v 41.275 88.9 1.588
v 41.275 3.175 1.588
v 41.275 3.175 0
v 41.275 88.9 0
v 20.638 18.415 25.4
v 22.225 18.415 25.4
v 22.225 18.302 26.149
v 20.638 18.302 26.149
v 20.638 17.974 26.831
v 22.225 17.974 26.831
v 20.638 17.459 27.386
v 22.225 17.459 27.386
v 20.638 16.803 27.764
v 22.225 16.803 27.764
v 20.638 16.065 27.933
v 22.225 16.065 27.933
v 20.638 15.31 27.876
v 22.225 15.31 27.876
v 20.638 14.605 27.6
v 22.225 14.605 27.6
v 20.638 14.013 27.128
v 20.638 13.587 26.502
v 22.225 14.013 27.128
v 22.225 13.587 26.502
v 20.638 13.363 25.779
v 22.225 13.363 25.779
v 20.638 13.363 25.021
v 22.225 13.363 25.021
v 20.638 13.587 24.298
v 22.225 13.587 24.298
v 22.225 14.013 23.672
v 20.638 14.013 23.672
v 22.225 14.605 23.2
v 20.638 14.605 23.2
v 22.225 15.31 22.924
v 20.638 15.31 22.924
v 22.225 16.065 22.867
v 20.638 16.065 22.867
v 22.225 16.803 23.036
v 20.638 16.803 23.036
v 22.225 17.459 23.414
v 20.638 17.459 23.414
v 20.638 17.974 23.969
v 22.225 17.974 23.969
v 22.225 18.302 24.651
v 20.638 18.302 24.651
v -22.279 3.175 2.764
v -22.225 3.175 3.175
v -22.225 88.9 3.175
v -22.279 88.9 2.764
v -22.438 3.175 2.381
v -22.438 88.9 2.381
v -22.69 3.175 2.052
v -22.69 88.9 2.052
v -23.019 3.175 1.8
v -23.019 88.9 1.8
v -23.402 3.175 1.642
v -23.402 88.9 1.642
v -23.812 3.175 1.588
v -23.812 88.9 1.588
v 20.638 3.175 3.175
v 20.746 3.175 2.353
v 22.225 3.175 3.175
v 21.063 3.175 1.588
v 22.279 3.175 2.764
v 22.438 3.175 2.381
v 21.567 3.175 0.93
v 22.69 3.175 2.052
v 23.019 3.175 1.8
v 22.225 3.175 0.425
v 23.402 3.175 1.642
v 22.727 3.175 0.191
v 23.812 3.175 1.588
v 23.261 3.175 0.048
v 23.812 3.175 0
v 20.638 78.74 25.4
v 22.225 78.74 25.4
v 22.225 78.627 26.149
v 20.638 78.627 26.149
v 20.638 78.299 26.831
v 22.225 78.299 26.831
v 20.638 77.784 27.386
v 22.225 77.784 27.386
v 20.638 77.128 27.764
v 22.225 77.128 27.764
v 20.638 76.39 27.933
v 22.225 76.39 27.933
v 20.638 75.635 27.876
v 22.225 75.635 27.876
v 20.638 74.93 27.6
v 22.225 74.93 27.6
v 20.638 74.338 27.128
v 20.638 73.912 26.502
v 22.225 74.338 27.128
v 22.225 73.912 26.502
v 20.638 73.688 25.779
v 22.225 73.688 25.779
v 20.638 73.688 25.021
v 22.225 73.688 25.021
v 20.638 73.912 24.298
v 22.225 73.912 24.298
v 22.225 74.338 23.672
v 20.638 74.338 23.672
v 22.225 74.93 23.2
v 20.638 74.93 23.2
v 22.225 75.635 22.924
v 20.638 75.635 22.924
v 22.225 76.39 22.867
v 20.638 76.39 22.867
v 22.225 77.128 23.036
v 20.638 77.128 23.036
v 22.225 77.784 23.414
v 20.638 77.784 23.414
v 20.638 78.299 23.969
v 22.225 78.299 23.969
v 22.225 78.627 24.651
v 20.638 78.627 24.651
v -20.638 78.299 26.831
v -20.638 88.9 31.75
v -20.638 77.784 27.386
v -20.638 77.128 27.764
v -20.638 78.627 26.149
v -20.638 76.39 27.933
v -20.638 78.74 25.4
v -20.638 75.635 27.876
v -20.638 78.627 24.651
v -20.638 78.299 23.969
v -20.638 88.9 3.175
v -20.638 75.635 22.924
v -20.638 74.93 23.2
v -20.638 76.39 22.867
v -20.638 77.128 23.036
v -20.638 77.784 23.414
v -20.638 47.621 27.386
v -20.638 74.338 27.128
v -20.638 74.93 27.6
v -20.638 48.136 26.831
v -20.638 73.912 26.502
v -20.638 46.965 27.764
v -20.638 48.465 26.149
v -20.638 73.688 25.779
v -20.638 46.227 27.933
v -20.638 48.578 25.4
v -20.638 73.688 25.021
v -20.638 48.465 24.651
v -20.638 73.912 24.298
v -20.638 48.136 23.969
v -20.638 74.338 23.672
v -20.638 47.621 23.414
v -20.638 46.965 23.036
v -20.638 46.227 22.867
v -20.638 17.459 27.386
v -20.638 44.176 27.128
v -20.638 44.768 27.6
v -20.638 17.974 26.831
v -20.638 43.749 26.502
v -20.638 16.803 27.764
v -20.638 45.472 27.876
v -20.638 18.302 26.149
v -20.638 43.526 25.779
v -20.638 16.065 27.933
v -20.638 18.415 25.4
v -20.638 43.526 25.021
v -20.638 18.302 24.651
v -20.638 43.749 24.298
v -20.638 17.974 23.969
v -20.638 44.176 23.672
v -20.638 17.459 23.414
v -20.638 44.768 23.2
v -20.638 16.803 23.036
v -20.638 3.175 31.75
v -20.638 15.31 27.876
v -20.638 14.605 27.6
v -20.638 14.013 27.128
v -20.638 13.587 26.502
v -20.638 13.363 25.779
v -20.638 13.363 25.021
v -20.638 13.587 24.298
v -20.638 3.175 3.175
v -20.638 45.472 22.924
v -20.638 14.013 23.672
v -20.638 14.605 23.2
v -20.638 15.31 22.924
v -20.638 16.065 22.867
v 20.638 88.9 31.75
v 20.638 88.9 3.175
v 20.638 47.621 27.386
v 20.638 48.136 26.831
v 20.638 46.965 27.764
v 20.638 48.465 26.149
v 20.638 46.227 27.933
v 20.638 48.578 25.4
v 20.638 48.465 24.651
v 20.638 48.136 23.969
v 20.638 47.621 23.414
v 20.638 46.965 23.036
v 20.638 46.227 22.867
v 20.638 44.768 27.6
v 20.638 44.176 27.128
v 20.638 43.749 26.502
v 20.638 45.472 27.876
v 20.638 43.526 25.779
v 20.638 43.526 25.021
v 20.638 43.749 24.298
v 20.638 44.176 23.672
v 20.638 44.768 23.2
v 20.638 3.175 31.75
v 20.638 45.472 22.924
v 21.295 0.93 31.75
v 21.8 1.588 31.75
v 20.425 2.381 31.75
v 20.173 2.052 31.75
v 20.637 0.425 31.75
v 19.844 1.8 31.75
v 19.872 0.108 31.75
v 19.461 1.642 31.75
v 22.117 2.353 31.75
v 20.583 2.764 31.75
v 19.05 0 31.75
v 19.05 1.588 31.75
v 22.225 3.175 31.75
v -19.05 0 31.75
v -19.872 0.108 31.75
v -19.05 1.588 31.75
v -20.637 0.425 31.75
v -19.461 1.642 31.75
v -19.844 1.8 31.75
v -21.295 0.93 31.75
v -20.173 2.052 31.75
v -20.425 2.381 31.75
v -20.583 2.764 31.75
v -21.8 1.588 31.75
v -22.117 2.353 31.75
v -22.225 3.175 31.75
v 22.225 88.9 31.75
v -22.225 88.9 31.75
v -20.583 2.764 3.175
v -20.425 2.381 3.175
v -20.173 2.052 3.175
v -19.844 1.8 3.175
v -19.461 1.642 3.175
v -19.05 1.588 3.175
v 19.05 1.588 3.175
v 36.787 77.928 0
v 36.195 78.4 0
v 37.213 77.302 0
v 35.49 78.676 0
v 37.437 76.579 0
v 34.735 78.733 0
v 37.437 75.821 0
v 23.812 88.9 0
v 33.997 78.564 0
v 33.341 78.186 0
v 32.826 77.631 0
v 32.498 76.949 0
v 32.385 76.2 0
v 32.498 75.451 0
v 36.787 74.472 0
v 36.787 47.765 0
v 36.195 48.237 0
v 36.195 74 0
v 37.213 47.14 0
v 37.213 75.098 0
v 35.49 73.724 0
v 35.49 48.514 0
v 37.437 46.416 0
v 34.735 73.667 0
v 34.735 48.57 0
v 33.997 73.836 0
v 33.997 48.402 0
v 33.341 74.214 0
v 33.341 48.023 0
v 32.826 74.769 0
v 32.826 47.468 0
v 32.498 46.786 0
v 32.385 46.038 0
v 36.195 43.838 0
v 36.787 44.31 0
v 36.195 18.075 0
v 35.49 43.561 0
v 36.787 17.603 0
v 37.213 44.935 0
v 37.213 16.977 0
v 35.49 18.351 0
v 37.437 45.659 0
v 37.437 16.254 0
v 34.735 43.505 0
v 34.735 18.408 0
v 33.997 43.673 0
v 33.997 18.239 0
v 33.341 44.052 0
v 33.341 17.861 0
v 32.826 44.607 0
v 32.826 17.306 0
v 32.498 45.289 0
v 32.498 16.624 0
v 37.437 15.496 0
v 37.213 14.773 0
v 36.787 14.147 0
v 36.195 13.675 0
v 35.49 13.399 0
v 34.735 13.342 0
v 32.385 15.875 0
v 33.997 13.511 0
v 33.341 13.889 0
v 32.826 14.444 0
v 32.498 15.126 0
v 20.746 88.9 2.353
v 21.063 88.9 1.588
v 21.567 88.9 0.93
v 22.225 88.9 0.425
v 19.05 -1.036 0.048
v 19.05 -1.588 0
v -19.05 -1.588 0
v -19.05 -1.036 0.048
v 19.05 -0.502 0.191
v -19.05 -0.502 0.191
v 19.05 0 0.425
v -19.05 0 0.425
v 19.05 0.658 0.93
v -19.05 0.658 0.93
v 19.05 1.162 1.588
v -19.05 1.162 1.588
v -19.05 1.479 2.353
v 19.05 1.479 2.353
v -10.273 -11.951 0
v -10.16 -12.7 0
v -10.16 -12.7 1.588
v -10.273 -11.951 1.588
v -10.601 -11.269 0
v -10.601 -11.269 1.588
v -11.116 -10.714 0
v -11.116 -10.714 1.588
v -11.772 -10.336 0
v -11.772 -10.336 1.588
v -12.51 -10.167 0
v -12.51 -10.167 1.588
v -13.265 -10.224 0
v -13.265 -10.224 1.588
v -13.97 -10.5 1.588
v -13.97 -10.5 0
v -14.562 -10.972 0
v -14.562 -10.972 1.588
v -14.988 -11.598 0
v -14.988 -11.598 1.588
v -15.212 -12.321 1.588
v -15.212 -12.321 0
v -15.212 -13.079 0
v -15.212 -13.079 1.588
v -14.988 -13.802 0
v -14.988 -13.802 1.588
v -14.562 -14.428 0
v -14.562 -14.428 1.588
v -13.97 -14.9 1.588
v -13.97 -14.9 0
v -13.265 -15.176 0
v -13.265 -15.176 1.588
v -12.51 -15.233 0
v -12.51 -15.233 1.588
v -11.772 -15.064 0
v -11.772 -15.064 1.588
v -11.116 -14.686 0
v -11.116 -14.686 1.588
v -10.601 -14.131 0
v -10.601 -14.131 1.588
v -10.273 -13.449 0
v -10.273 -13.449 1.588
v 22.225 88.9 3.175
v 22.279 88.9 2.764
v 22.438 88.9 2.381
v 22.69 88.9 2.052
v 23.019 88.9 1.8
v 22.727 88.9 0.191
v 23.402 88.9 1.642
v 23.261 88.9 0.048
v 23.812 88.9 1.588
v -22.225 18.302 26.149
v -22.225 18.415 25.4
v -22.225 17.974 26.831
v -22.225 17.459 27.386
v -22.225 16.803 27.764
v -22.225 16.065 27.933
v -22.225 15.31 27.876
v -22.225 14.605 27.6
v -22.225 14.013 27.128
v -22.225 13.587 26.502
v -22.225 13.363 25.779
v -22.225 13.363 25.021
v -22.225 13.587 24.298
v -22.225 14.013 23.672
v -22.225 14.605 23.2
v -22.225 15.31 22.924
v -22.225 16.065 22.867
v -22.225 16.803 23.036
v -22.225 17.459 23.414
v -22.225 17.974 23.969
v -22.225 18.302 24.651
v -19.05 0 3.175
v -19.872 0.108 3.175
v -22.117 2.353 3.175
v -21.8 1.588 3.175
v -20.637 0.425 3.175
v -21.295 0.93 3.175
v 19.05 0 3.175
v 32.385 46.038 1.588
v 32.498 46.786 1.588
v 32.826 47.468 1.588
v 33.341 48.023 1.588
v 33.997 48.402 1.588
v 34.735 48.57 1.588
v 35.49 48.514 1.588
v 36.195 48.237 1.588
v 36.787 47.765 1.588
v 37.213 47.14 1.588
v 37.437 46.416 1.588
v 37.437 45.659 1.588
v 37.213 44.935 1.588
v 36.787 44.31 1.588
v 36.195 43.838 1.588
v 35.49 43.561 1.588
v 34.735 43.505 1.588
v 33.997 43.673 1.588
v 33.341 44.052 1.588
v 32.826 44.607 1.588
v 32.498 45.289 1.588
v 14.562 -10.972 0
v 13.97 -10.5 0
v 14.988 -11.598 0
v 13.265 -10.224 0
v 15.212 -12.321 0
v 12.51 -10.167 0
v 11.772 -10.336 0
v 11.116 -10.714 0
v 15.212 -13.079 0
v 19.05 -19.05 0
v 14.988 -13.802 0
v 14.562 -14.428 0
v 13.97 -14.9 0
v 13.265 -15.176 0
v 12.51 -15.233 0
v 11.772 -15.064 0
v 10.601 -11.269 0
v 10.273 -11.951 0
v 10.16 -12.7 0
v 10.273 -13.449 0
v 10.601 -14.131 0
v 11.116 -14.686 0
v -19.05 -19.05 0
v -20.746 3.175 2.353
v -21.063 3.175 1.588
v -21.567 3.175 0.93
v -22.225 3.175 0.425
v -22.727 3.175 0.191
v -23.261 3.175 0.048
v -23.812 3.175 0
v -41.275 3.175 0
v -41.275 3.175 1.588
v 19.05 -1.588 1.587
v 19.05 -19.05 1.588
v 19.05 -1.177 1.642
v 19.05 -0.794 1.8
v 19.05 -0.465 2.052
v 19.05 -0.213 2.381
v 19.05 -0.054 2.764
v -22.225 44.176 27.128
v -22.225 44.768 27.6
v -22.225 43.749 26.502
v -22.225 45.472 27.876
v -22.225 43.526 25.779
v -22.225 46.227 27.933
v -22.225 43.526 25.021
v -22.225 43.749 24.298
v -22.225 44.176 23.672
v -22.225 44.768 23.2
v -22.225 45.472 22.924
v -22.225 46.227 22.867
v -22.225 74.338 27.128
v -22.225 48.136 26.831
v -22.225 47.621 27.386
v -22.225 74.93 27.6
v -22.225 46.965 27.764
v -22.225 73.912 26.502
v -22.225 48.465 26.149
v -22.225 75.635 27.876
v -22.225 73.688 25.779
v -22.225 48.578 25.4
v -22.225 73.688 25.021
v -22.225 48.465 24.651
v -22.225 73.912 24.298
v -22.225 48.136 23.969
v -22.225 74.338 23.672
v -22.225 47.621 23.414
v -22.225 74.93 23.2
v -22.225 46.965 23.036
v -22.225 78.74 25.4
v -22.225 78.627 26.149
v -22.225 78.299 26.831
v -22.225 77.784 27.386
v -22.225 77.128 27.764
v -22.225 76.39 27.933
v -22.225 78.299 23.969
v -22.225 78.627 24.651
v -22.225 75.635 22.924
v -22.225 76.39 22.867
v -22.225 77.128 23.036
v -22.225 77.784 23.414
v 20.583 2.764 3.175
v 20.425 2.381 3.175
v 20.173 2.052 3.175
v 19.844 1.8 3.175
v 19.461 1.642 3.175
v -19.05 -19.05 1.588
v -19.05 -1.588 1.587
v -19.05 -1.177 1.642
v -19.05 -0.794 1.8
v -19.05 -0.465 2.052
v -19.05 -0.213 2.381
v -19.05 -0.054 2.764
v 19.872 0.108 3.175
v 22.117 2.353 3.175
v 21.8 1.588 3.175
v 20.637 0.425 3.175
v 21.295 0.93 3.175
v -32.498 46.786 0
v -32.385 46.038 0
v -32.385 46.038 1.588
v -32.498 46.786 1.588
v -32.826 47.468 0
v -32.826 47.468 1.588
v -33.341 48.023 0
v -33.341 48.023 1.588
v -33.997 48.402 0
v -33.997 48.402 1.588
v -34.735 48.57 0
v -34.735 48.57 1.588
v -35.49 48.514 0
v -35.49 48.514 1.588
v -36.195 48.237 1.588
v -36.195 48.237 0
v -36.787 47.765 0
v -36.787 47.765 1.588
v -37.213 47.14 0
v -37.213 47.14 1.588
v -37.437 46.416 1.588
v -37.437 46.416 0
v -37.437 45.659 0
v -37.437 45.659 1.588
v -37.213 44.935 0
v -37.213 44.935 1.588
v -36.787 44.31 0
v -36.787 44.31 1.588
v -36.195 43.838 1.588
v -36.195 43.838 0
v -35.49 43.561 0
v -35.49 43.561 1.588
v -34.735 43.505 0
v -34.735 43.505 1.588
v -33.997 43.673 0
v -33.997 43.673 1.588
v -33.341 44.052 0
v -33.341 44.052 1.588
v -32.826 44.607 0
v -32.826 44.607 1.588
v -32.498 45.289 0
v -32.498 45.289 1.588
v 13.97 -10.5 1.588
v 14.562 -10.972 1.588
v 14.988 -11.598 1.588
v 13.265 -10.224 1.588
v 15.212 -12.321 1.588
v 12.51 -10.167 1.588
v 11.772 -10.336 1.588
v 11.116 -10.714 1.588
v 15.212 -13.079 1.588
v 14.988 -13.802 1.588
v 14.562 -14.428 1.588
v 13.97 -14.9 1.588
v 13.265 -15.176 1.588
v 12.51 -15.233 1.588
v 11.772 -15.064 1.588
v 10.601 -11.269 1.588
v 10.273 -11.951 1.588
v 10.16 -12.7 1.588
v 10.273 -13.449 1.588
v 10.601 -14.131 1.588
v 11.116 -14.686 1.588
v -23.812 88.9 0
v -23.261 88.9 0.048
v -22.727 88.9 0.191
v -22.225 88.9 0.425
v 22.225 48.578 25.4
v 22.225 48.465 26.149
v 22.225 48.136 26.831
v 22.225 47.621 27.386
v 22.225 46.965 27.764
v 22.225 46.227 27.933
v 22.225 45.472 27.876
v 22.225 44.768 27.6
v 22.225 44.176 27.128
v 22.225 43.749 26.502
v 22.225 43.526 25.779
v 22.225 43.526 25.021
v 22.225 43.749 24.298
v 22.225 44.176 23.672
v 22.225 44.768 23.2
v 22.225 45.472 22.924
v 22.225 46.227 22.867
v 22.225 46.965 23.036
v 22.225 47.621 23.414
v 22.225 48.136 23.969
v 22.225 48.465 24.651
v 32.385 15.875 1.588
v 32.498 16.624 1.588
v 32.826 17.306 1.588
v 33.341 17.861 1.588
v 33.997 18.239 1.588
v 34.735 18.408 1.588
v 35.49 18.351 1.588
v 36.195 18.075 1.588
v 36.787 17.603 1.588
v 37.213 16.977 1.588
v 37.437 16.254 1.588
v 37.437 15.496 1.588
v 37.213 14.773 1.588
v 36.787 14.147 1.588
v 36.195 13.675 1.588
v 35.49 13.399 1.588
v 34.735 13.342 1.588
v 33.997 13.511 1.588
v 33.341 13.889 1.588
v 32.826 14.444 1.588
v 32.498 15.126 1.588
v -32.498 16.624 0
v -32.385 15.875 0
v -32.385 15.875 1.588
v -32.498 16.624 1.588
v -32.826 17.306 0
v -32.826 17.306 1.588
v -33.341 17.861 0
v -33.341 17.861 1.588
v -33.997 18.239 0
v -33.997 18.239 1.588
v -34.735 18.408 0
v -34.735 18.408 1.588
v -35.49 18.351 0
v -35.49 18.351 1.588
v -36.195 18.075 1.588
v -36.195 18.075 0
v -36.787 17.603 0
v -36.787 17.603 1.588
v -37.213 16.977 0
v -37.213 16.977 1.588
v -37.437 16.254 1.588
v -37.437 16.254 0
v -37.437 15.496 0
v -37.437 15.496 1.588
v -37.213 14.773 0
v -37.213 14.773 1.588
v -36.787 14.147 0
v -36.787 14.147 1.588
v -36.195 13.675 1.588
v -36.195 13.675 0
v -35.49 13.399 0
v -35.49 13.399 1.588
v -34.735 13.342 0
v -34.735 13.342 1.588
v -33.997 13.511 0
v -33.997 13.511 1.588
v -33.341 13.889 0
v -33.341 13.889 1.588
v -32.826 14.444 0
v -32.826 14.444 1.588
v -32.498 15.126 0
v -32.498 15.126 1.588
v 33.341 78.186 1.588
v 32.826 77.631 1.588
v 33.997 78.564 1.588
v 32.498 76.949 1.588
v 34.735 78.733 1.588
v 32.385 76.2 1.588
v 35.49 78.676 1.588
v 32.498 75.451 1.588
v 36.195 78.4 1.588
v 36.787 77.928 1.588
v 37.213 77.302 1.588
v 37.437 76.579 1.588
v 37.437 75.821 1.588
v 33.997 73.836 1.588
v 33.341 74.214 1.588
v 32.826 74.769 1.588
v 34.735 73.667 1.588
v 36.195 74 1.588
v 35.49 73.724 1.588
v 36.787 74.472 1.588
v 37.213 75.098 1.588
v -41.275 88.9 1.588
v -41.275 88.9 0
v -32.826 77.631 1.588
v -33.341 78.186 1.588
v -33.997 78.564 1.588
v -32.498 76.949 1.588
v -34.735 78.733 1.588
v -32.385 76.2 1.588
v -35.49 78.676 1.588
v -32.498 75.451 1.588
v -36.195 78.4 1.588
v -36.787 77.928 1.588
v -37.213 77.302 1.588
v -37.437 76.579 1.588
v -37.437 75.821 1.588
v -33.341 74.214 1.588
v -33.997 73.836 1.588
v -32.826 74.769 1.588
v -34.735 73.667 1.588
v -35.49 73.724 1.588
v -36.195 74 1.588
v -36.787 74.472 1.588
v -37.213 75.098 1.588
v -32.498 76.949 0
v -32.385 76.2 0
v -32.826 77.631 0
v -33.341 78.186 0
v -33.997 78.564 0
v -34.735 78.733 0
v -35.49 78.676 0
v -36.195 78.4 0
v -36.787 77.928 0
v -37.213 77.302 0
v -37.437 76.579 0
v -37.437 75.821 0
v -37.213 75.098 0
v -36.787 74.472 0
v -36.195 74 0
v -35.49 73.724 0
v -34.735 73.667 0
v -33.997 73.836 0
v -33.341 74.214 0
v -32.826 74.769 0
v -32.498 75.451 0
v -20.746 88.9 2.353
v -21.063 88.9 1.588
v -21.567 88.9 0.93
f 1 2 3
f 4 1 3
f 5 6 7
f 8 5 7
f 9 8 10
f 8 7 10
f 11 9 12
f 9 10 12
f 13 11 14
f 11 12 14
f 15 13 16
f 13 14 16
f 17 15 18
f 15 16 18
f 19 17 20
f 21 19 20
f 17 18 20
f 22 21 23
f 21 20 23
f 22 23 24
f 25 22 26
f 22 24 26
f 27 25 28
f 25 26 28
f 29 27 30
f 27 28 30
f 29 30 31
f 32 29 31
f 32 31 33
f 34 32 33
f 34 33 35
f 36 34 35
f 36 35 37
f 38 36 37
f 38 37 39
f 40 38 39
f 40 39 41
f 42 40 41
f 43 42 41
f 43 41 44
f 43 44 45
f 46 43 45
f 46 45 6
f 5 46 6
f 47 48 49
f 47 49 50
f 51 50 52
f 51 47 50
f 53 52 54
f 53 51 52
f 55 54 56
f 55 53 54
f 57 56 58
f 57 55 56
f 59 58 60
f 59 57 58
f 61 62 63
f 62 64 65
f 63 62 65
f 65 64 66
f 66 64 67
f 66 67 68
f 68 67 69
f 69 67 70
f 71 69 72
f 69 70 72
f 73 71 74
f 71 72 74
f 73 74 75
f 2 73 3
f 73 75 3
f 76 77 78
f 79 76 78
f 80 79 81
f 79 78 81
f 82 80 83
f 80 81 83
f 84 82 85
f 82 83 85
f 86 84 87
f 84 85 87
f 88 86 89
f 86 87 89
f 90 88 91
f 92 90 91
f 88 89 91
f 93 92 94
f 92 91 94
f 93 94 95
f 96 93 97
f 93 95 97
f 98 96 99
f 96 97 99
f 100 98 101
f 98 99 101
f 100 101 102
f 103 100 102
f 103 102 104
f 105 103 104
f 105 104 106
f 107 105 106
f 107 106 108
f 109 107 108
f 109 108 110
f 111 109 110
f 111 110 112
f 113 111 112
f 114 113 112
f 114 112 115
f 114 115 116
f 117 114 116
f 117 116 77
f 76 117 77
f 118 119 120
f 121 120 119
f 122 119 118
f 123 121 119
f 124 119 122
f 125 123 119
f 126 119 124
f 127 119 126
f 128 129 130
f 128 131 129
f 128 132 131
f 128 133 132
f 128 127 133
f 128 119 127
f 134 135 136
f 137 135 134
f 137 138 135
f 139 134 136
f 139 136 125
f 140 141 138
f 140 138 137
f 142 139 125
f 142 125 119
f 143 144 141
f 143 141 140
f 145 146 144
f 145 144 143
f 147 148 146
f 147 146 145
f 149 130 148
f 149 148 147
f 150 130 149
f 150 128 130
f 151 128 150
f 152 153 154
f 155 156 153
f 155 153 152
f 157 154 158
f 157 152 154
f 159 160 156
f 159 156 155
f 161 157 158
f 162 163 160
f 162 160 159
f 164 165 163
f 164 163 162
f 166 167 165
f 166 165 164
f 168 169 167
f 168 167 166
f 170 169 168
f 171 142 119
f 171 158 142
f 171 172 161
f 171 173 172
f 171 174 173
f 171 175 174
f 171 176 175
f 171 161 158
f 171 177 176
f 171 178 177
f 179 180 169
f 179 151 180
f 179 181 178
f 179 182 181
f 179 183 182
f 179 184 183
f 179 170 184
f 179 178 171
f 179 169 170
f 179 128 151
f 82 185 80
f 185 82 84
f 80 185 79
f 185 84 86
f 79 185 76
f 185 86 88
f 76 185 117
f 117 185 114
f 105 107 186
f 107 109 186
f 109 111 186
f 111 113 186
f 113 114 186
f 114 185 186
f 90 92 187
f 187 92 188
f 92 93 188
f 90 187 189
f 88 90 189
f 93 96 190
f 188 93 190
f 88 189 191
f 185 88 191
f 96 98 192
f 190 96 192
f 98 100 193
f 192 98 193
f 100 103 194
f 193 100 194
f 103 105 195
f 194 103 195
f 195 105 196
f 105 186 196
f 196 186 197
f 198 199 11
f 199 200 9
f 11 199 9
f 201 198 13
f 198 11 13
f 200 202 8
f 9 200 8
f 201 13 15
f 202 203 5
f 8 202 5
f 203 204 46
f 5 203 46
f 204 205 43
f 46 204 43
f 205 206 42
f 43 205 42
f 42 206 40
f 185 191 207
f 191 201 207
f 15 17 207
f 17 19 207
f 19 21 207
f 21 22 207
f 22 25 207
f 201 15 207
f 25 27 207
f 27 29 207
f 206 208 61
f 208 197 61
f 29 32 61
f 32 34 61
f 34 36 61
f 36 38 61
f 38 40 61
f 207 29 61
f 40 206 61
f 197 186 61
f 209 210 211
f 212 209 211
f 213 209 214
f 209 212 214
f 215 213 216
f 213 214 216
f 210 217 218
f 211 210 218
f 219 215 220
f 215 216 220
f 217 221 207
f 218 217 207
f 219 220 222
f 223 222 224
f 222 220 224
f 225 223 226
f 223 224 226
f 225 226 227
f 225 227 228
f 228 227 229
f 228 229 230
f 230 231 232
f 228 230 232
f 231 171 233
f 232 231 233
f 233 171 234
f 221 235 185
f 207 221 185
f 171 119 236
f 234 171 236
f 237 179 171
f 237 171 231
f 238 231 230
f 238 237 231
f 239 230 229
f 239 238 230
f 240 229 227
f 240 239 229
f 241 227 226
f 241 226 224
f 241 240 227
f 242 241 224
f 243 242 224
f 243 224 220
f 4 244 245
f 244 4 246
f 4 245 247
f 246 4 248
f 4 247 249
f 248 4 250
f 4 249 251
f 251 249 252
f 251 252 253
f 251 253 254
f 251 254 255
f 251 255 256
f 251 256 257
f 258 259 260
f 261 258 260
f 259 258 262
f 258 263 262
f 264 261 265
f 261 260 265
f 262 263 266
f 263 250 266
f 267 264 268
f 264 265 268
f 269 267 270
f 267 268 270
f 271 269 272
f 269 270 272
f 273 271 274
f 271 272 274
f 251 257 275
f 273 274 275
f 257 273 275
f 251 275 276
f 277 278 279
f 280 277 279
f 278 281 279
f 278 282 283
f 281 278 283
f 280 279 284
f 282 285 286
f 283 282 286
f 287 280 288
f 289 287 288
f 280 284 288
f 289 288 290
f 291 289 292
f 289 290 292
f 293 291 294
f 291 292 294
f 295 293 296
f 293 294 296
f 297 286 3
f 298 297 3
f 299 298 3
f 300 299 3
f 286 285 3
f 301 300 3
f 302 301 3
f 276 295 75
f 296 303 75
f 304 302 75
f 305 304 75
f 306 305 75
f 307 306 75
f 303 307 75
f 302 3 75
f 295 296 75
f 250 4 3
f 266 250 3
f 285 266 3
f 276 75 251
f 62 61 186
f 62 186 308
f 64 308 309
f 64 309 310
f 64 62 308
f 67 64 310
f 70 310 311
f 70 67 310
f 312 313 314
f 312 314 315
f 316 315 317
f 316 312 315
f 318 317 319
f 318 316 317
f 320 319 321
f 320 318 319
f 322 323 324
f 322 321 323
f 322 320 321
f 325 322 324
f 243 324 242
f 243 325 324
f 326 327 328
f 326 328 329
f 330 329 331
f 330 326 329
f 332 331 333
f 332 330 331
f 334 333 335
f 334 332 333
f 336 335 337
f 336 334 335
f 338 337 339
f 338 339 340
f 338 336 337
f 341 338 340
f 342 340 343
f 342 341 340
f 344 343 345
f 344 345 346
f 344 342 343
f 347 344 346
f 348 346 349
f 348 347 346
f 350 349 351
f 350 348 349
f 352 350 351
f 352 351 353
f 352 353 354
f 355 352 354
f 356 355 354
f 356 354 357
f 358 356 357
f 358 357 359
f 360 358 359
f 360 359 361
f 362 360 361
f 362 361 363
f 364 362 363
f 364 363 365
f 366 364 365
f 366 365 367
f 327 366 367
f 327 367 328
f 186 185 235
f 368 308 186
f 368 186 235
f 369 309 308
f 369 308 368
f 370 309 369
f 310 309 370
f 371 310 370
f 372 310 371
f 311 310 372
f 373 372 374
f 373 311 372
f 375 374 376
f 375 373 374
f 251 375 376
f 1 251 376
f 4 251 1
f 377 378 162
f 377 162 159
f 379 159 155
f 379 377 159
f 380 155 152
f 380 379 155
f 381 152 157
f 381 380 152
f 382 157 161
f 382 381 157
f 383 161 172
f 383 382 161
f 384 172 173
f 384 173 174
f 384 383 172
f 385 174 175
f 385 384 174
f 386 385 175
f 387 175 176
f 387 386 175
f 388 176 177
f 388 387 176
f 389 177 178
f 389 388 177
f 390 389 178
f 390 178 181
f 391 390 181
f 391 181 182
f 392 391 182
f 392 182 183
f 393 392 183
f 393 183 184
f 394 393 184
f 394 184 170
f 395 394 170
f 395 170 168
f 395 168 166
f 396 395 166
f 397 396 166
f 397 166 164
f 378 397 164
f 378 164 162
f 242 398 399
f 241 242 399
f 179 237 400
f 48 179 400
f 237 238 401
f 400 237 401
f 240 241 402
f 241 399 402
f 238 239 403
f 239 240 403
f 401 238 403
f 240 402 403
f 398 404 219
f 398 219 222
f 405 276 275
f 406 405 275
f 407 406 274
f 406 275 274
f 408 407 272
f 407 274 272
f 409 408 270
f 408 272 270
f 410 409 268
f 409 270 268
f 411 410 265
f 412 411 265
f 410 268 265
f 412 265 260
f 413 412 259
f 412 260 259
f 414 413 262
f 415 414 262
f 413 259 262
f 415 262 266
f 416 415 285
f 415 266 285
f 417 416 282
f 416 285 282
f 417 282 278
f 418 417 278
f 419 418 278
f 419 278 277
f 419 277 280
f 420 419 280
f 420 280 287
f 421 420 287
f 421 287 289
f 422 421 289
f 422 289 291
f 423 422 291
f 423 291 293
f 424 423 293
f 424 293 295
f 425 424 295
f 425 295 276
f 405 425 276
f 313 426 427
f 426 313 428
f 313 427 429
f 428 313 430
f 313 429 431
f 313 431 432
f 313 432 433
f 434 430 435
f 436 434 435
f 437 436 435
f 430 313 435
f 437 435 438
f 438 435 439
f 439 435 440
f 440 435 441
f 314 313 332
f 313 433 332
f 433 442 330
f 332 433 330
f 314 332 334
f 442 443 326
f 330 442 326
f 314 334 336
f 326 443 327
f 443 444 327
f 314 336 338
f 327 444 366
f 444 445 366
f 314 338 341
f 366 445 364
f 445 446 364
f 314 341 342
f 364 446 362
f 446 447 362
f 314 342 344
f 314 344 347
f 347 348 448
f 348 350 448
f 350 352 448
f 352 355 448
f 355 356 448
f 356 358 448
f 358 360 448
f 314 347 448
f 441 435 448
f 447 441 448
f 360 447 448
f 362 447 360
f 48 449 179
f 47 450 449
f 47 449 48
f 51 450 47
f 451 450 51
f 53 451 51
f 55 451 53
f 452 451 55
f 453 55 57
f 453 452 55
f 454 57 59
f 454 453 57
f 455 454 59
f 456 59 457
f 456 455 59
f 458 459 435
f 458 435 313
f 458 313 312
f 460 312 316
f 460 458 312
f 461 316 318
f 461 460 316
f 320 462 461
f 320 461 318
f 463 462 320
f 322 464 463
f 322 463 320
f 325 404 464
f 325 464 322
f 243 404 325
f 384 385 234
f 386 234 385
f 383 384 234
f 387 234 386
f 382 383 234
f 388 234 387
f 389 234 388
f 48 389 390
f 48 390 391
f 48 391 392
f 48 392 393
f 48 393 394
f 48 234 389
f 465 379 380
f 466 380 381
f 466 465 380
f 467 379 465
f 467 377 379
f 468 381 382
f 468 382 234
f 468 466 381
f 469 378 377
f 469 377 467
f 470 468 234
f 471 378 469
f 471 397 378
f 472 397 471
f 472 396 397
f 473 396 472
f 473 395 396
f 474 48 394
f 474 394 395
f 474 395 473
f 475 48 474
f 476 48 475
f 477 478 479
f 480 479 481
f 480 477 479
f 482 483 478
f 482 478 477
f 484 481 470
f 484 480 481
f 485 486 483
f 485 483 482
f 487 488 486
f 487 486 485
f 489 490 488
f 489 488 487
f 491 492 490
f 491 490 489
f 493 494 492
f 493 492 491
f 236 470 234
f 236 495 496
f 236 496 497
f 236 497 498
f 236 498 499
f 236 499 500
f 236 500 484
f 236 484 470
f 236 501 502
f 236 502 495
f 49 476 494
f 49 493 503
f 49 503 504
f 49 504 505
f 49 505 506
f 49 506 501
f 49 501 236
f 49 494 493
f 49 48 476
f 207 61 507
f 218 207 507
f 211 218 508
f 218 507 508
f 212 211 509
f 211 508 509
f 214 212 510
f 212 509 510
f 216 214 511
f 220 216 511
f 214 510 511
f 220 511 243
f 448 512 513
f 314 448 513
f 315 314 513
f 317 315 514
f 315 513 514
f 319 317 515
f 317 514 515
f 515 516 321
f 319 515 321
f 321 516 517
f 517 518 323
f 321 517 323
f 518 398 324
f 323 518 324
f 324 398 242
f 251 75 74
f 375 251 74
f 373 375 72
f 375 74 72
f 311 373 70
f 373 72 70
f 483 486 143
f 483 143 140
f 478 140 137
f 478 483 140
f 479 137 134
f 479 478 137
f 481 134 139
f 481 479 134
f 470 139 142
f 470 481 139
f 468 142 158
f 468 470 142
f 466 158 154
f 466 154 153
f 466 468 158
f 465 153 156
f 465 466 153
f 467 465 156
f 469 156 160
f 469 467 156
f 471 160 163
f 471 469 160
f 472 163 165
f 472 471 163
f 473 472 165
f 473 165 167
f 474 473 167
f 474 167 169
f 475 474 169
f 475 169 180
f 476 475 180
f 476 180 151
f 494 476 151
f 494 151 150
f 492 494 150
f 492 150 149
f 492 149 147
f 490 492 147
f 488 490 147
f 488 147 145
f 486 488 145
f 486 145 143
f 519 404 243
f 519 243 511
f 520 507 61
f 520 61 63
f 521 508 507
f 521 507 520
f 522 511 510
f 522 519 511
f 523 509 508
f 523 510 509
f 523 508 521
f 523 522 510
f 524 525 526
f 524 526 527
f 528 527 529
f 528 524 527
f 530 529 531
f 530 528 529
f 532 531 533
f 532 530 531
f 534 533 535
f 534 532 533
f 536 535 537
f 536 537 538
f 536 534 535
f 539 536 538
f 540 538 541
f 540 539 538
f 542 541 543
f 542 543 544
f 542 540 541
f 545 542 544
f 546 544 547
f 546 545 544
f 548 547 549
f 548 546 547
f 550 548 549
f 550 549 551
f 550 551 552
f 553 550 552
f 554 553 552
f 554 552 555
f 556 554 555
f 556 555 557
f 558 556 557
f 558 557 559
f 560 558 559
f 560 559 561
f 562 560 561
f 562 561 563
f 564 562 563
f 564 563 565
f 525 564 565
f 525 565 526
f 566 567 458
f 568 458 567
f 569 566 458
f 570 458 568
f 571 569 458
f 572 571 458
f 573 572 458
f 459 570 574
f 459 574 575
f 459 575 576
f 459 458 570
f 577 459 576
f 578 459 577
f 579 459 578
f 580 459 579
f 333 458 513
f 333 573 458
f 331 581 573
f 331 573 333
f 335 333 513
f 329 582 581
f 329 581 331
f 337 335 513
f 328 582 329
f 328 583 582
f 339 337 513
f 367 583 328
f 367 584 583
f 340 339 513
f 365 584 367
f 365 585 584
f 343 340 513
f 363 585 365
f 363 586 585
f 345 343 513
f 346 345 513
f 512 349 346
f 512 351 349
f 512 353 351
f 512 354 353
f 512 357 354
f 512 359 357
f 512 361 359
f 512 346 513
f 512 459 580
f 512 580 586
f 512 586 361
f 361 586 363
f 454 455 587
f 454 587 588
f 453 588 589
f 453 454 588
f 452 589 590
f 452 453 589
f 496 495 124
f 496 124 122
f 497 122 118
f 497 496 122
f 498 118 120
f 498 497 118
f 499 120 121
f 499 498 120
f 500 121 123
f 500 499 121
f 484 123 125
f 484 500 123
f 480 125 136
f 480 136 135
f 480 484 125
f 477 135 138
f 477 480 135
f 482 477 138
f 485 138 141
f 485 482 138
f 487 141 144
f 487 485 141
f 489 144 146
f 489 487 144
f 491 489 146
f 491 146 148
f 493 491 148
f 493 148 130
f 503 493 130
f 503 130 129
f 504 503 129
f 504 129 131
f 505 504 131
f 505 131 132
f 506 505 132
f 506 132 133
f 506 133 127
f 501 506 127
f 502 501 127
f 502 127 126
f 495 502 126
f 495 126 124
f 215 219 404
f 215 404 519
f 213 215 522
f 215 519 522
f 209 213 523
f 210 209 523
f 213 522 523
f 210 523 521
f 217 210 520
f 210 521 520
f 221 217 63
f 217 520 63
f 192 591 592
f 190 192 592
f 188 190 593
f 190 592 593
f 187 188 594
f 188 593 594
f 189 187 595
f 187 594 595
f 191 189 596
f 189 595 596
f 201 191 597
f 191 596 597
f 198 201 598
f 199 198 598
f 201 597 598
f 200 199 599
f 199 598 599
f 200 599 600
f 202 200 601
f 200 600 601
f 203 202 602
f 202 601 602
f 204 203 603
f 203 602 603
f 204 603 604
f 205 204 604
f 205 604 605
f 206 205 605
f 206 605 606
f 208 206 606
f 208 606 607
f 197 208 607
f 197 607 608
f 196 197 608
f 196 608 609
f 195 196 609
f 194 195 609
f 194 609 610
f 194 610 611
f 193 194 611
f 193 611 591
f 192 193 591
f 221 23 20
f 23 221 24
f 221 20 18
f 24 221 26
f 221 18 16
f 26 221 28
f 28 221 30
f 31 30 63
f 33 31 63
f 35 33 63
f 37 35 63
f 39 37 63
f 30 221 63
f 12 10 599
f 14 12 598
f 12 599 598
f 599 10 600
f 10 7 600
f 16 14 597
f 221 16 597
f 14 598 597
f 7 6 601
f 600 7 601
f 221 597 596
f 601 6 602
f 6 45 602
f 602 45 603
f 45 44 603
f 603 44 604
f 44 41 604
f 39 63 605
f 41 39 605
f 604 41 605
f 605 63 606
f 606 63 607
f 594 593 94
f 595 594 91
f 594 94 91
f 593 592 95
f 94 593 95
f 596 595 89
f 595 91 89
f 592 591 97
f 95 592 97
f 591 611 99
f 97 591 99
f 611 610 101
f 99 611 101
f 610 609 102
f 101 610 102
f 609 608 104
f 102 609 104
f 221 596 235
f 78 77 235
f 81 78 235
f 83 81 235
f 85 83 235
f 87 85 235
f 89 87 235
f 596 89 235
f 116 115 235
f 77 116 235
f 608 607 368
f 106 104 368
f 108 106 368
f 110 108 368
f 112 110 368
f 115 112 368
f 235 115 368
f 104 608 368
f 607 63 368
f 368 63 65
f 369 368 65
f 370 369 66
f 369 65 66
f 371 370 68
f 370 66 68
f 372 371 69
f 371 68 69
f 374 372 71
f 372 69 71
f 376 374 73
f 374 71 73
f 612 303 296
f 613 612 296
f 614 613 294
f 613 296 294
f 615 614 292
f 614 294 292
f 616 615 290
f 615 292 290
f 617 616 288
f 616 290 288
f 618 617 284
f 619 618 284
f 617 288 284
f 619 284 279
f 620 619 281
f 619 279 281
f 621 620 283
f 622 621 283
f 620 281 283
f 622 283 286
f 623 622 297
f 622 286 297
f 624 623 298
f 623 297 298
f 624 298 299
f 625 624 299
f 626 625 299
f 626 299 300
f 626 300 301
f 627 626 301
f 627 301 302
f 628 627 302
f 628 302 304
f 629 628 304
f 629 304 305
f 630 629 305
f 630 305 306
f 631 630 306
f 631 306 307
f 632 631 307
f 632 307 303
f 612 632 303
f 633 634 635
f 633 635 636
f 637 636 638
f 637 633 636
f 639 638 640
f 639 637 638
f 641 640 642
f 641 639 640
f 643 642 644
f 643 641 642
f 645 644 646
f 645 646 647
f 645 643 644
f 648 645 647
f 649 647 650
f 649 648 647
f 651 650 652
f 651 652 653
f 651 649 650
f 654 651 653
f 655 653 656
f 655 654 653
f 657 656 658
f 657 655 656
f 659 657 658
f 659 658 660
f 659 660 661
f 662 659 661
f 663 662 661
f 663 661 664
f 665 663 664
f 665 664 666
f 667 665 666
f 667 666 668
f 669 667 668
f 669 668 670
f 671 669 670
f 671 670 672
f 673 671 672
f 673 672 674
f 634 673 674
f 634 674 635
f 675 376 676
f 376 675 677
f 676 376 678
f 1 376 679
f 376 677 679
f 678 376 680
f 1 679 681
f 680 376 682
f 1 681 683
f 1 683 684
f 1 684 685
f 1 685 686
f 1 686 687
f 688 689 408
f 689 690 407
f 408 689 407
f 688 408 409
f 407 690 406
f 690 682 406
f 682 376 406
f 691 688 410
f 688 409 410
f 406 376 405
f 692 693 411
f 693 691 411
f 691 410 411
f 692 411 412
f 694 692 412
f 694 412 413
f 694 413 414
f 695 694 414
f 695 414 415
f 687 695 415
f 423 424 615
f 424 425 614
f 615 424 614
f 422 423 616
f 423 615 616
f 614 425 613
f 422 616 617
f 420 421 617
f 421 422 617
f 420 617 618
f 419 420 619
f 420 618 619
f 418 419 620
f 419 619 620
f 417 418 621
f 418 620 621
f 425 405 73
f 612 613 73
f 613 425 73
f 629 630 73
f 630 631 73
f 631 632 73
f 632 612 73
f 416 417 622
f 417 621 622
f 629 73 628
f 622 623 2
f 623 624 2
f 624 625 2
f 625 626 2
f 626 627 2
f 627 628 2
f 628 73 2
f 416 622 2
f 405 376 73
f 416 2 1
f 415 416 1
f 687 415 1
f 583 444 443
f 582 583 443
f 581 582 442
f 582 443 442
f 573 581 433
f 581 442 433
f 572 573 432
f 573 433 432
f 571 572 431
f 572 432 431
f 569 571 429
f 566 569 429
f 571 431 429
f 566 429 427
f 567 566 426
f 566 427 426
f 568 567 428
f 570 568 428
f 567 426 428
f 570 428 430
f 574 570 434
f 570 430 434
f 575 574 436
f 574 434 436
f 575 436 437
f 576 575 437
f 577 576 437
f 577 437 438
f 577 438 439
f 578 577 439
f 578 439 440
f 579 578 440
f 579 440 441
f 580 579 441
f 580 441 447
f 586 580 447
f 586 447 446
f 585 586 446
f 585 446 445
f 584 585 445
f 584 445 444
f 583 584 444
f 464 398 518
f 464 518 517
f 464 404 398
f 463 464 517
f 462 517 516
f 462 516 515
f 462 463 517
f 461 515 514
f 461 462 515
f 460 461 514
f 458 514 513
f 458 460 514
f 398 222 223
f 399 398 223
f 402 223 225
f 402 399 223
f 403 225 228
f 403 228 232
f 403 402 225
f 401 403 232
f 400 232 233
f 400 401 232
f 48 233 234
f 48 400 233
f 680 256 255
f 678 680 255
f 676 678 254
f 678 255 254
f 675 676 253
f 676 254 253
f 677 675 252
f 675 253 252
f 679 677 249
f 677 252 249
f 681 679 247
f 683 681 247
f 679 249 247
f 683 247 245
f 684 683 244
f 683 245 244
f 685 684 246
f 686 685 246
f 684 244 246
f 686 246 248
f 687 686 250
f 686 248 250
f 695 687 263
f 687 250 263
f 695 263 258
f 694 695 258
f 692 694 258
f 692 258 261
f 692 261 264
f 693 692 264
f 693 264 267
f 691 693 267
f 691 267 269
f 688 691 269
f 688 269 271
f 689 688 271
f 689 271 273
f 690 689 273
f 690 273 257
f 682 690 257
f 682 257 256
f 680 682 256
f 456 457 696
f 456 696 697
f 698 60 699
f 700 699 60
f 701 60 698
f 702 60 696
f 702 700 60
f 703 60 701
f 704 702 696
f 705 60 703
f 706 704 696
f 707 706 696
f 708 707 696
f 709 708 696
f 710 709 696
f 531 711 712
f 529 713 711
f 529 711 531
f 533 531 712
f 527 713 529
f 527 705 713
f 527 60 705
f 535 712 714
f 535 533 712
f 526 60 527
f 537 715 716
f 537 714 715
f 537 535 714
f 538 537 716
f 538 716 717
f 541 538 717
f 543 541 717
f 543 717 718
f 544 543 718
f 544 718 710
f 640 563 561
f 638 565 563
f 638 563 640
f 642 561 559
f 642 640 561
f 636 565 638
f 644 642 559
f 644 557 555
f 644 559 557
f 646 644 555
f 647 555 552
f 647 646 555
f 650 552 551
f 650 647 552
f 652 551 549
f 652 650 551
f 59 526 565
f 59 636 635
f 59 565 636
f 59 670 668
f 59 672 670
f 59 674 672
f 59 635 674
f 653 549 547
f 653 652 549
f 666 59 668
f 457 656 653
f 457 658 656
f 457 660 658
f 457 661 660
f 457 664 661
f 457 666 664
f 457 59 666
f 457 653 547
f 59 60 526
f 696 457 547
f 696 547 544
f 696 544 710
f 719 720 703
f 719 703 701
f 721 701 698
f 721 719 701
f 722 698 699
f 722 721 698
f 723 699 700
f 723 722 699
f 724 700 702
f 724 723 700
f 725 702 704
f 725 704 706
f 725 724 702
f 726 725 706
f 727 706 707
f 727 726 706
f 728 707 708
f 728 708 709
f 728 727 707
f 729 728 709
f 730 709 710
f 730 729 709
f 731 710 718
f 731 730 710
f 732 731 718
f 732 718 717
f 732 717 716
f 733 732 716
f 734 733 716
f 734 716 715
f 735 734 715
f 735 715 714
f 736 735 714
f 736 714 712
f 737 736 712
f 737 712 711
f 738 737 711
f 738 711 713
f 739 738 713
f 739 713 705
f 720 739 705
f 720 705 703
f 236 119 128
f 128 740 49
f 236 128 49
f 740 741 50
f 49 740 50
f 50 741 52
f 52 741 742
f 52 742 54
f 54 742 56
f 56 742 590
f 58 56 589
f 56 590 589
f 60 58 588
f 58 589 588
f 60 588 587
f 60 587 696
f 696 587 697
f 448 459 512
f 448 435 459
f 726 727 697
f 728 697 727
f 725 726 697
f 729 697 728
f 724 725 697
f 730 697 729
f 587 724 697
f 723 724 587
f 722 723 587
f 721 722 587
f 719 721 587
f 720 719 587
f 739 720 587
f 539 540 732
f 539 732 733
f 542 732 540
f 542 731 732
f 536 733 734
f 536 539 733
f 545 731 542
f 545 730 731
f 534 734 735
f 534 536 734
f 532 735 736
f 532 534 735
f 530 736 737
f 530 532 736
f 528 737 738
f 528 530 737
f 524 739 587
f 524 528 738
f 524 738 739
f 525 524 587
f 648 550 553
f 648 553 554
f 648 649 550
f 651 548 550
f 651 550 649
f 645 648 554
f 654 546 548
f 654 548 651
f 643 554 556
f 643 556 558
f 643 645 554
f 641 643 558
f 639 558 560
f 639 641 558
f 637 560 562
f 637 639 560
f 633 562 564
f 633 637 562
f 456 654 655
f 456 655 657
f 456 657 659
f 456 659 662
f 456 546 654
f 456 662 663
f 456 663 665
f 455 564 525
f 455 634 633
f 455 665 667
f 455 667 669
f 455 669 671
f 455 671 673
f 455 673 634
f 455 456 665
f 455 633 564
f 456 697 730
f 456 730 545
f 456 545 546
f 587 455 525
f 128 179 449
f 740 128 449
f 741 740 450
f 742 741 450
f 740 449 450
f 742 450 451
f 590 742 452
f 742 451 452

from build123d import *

# Parameters (mm, degrees)
BASE_FLANGE_DEPTH         = 31.75
MITER_FLANGE2_DEPTH       = 88.9
MITER_FLANGE2_2_DEPTH     = 3.175
MITER_START               = 3.175
MITER_FLANGE2_3_DEPTH     = 85.725
MITER_START_2             = -19.05
MITER_FLANGE2_4_OUTLINE_W = 19.05
MITER_FLANGE2_4_OUTLINE_H = 1.5875
MITER_FLANGE2_4_DEPTH     = 17.4625
MITER_FLANGE2_5_DEPTH     = 19.05
MITER_FLANGE2_6_DEPTH     = 19.05
CUT_EXTRUDE1_REACH        = 105.029
SKETCH4_R                 = 2.54
CUT_EXTRUDE2_REACH        = 105.029
SKETCH5_R                 = 2.54
CUT_EXTRUDE4_REACH        = 107.049
SKETCH7_R                 = 2.54


with BuildPart() as part:
    # Base-Flange: sheet metal written as solids
    # Sketch1 → Base-Flange (new body)
    with BuildSketch(Plane.XY):
        with BuildLine():
            Line((0, 0), (19.05, 0))
            ThreePointArc((19.05, 0), (21.29506403, 0.92993597), (22.225, 3.175))
            Line((22.225, 3.175), (22.225, 88.9))
            Line((22.225, 88.9), (20.6375, 88.9))
            Line((20.6375, 88.9), (20.6375, 3.175))
            ThreePointArc((20.6375, 3.175), (20.172532015, 2.052467985), (19.05, 1.5875))
            Line((19.05, 1.5875), (0, 1.5875))
            Line((0, 1.5875), (0, 0))
        make_face()
    extrude(amount=BASE_FLANGE_DEPTH)

    # Miter Flange2: read off the stored shape, not the designer's step
    # Miter Flange2 outline → Miter Flange2 (cut)
    with BuildSketch(Plane(origin=(0, 0, 0), x_dir=(1, 0, 0), z_dir=(0, 1, 0))):
        with BuildLine():
            Line((22.225, 0), (19.05, 0))
            Line((19.05, 0), (19.05, -3.175))
            Line((19.05, -3.175), (20.6375, -3.175))
            ThreePointArc((20.6375, -3.175), (21.062869343, -1.5875), (22.225, -0.425369343))
            Line((22.225, -0.425369343), (22.225, 0))
        make_face()
    extrude(amount=MITER_FLANGE2_DEPTH, mode=Mode.SUBTRACT)

    # Miter Flange2 2 outline → Miter Flange2 2 (cut)
    with BuildSketch(Plane(origin=(0, 0, 0), x_dir=(1, 0, 0), z_dir=(0, 1, 0))):
        with BuildLine():
            Line((20.6375, -3.175), (22.225, -3.175))
            Line((22.225, -3.175), (22.225, -0.425369343))
            ThreePointArc((22.225, -0.425369343), (21.062869343, -1.5875), (20.6375, -3.175))
        make_face()
    extrude(amount=MITER_FLANGE2_2_DEPTH, mode=Mode.SUBTRACT)

    # Miter Flange2 3 outline → Miter Flange2 3 (add)
    with BuildSketch(Plane(origin=(0, 0, 0), x_dir=(1, 0, 0), z_dir=(0, 1, 0)).offset(MITER_START)):
        with BuildLine():
            Line((22.225, -0.425369343), (22.225, -3.175))
            ThreePointArc((22.225, -3.175), (22.689967985, -2.052467985), (23.8125, -1.5875))
            Line((23.8125, -1.5875), (41.275, -1.5875))
            Line((41.275, -1.5875), (41.275, 0))
            Line((41.275, 0), (23.8125, 0))
            ThreePointArc((23.8125, 0), (22.990749532, -0.108185502), (22.225, -0.425369343))
        make_face()
    extrude(amount=MITER_FLANGE2_3_DEPTH)

    # Miter Flange2 5 outline → Miter Flange2 5 (cut)
    with BuildSketch(Plane.YZ):
        with BuildLine():
            ThreePointArc((1.5875, 3.175), (1.162130657, 1.5875), (0, 0.425369343))
            Line((0, 0.425369343), (0, 0))
            Line((0, 0), (1.5875, 0))
            Line((1.5875, 0), (1.5875, 3.175))
        make_face()
    extrude(amount=MITER_FLANGE2_5_DEPTH, mode=Mode.SUBTRACT)



with BuildPart() as body_2:
    # Miter Flange2 4 outline → Miter Flange2 4 (new body)
    with BuildSketch(Plane(origin=(0, 0, 0), x_dir=(1, 0, 0), z_dir=(0, 1, 0)).offset(MITER_START_2)):
        with Locations((9.525, -0.79375)):
            Rectangle(MITER_FLANGE2_4_OUTLINE_W, MITER_FLANGE2_4_OUTLINE_H)
    extrude(amount=MITER_FLANGE2_4_DEPTH)


with BuildPart() as part_1:
    add(part.part)

    add(body_2.part)  # Miter Flange2 6 merges body 2
    # Miter Flange2 6 outline → Miter Flange2 6 (add)
    with BuildSketch(Plane.YZ):
        with BuildLine():
            Line((0, 0.425369343), (0, 3.175))
            ThreePointArc((0, 3.175), (-0.464967985, 2.052467985), (-1.5875, 1.5875))
            Line((-1.5875, 1.5875), (-1.5875, 0))
            ThreePointArc((-1.5875, 0), (-0.765749532, 0.108185502), (0, 0.425369343))
        make_face()
    extrude(amount=MITER_FLANGE2_6_DEPTH)

    # Sketch4 → Cut-Extrude1 (cut, up to next)
    with BuildSketch(Plane(origin=(0, 0, 0), x_dir=(-1, 0, 0), z_dir=(0, 0, -1)), mode=Mode.PRIVATE) as cut_extrude1_sk1:
        with Locations((-34.925, 76.2)):
            Circle(SKETCH4_R)
    cut_extrude1_tool1 = extrude(cut_extrude1_sk1.sketch, amount=-CUT_EXTRUDE1_REACH, mode=Mode.PRIVATE) & part_1.part
    # Sketch4 → Cut-Extrude1 (cut, up to next)
    with BuildSketch(Plane(origin=(0, 0, 0), x_dir=(-1, 0, 0), z_dir=(0, 0, -1)), mode=Mode.PRIVATE) as cut_extrude1_sk2:
        with Locations((-34.925, 46.0375)):
            Circle(SKETCH4_R)
    cut_extrude1_tool2 = extrude(cut_extrude1_sk2.sketch, amount=-CUT_EXTRUDE1_REACH, mode=Mode.PRIVATE) & part_1.part
    # Sketch4 → Cut-Extrude1 (cut, up to next)
    with BuildSketch(Plane(origin=(0, 0, 0), x_dir=(-1, 0, 0), z_dir=(0, 0, -1)), mode=Mode.PRIVATE) as cut_extrude1_sk3:
        with Locations((-34.925, 15.875)):
            Circle(SKETCH4_R)
    cut_extrude1_tool3 = extrude(cut_extrude1_sk3.sketch, amount=-CUT_EXTRUDE1_REACH, mode=Mode.PRIVATE) & part_1.part
    add(cut_extrude1_tool1.solids().sort_by_distance((34.925, 76.2, 0))[0], mode=Mode.SUBTRACT)
    add(cut_extrude1_tool2.solids().sort_by_distance((34.925, 46.0375, 0))[0], mode=Mode.SUBTRACT)
    add(cut_extrude1_tool3.solids().sort_by_distance((34.925, 15.875, 0))[0], mode=Mode.SUBTRACT)

    # Sketch5 → Cut-Extrude2 (cut, up to next)
    with BuildSketch(Plane(origin=(0, 0, 0), x_dir=(-1, 0, 0), z_dir=(0, 0, -1)), mode=Mode.PRIVATE) as cut_extrude2_sk1:
        with Locations((-12.7, -12.7)):
            Circle(SKETCH5_R)
    cut_extrude2_tool1 = extrude(cut_extrude2_sk1.sketch, amount=-CUT_EXTRUDE2_REACH, mode=Mode.PRIVATE) & part_1.part
    add(cut_extrude2_tool1.solids().sort_by_distance((12.7, -12.7, 0))[0], mode=Mode.SUBTRACT)

    # Sketch7 → Cut-Extrude4 (cut, up to next)
    with BuildSketch(Plane(origin=(22.225, -0.213353633, 50.991788494), x_dir=(0, 0, -1), z_dir=(1, 0, 0)), mode=Mode.PRIVATE) as cut_extrude4_sk1:
        with Locations(Location((25.591788494, 76.413353633, 0), (0, 0, 90))):
            Circle(SKETCH7_R)
    cut_extrude4_tool1 = extrude(cut_extrude4_sk1.sketch, amount=-CUT_EXTRUDE4_REACH, mode=Mode.PRIVATE) & part_1.part
    # Sketch7 → Cut-Extrude4 (cut, up to next)
    with BuildSketch(Plane(origin=(22.225, -0.213353633, 50.991788494), x_dir=(0, 0, -1), z_dir=(1, 0, 0)), mode=Mode.PRIVATE) as cut_extrude4_sk2:
        with Locations(Location((25.591788494, 46.250853633, 0), (0, 0, 90))):
            Circle(SKETCH7_R)
    cut_extrude4_tool2 = extrude(cut_extrude4_sk2.sketch, amount=-CUT_EXTRUDE4_REACH, mode=Mode.PRIVATE) & part_1.part
    # Sketch7 → Cut-Extrude4 (cut, up to next)
    with BuildSketch(Plane(origin=(22.225, -0.213353633, 50.991788494), x_dir=(0, 0, -1), z_dir=(1, 0, 0)), mode=Mode.PRIVATE) as cut_extrude4_sk3:
        with Locations(Location((25.591788494, 16.088353633, 0), (0, 0, 90))):
            Circle(SKETCH7_R)
    cut_extrude4_tool3 = extrude(cut_extrude4_sk3.sketch, amount=-CUT_EXTRUDE4_REACH, mode=Mode.PRIVATE) & part_1.part
    add(cut_extrude4_tool1.solids().sort_by_distance((22.225, 76.2, 25.4))[0], mode=Mode.SUBTRACT)
    add(cut_extrude4_tool2.solids().sort_by_distance((22.225, 46.0375, 25.4))[0], mode=Mode.SUBTRACT)
    add(cut_extrude4_tool3.solids().sort_by_distance((22.225, 15.875, 25.4))[0], mode=Mode.SUBTRACT)

    # SHM-Mirror1: part across plane


with BuildPart() as part_2:
    add(part_1.part)
    add(part_1.part.mirror(Plane(origin=(0, 0, 31.75), x_dir=(0, 0, 1), z_dir=(-1, 0, 0))))


solid = part_2.part
